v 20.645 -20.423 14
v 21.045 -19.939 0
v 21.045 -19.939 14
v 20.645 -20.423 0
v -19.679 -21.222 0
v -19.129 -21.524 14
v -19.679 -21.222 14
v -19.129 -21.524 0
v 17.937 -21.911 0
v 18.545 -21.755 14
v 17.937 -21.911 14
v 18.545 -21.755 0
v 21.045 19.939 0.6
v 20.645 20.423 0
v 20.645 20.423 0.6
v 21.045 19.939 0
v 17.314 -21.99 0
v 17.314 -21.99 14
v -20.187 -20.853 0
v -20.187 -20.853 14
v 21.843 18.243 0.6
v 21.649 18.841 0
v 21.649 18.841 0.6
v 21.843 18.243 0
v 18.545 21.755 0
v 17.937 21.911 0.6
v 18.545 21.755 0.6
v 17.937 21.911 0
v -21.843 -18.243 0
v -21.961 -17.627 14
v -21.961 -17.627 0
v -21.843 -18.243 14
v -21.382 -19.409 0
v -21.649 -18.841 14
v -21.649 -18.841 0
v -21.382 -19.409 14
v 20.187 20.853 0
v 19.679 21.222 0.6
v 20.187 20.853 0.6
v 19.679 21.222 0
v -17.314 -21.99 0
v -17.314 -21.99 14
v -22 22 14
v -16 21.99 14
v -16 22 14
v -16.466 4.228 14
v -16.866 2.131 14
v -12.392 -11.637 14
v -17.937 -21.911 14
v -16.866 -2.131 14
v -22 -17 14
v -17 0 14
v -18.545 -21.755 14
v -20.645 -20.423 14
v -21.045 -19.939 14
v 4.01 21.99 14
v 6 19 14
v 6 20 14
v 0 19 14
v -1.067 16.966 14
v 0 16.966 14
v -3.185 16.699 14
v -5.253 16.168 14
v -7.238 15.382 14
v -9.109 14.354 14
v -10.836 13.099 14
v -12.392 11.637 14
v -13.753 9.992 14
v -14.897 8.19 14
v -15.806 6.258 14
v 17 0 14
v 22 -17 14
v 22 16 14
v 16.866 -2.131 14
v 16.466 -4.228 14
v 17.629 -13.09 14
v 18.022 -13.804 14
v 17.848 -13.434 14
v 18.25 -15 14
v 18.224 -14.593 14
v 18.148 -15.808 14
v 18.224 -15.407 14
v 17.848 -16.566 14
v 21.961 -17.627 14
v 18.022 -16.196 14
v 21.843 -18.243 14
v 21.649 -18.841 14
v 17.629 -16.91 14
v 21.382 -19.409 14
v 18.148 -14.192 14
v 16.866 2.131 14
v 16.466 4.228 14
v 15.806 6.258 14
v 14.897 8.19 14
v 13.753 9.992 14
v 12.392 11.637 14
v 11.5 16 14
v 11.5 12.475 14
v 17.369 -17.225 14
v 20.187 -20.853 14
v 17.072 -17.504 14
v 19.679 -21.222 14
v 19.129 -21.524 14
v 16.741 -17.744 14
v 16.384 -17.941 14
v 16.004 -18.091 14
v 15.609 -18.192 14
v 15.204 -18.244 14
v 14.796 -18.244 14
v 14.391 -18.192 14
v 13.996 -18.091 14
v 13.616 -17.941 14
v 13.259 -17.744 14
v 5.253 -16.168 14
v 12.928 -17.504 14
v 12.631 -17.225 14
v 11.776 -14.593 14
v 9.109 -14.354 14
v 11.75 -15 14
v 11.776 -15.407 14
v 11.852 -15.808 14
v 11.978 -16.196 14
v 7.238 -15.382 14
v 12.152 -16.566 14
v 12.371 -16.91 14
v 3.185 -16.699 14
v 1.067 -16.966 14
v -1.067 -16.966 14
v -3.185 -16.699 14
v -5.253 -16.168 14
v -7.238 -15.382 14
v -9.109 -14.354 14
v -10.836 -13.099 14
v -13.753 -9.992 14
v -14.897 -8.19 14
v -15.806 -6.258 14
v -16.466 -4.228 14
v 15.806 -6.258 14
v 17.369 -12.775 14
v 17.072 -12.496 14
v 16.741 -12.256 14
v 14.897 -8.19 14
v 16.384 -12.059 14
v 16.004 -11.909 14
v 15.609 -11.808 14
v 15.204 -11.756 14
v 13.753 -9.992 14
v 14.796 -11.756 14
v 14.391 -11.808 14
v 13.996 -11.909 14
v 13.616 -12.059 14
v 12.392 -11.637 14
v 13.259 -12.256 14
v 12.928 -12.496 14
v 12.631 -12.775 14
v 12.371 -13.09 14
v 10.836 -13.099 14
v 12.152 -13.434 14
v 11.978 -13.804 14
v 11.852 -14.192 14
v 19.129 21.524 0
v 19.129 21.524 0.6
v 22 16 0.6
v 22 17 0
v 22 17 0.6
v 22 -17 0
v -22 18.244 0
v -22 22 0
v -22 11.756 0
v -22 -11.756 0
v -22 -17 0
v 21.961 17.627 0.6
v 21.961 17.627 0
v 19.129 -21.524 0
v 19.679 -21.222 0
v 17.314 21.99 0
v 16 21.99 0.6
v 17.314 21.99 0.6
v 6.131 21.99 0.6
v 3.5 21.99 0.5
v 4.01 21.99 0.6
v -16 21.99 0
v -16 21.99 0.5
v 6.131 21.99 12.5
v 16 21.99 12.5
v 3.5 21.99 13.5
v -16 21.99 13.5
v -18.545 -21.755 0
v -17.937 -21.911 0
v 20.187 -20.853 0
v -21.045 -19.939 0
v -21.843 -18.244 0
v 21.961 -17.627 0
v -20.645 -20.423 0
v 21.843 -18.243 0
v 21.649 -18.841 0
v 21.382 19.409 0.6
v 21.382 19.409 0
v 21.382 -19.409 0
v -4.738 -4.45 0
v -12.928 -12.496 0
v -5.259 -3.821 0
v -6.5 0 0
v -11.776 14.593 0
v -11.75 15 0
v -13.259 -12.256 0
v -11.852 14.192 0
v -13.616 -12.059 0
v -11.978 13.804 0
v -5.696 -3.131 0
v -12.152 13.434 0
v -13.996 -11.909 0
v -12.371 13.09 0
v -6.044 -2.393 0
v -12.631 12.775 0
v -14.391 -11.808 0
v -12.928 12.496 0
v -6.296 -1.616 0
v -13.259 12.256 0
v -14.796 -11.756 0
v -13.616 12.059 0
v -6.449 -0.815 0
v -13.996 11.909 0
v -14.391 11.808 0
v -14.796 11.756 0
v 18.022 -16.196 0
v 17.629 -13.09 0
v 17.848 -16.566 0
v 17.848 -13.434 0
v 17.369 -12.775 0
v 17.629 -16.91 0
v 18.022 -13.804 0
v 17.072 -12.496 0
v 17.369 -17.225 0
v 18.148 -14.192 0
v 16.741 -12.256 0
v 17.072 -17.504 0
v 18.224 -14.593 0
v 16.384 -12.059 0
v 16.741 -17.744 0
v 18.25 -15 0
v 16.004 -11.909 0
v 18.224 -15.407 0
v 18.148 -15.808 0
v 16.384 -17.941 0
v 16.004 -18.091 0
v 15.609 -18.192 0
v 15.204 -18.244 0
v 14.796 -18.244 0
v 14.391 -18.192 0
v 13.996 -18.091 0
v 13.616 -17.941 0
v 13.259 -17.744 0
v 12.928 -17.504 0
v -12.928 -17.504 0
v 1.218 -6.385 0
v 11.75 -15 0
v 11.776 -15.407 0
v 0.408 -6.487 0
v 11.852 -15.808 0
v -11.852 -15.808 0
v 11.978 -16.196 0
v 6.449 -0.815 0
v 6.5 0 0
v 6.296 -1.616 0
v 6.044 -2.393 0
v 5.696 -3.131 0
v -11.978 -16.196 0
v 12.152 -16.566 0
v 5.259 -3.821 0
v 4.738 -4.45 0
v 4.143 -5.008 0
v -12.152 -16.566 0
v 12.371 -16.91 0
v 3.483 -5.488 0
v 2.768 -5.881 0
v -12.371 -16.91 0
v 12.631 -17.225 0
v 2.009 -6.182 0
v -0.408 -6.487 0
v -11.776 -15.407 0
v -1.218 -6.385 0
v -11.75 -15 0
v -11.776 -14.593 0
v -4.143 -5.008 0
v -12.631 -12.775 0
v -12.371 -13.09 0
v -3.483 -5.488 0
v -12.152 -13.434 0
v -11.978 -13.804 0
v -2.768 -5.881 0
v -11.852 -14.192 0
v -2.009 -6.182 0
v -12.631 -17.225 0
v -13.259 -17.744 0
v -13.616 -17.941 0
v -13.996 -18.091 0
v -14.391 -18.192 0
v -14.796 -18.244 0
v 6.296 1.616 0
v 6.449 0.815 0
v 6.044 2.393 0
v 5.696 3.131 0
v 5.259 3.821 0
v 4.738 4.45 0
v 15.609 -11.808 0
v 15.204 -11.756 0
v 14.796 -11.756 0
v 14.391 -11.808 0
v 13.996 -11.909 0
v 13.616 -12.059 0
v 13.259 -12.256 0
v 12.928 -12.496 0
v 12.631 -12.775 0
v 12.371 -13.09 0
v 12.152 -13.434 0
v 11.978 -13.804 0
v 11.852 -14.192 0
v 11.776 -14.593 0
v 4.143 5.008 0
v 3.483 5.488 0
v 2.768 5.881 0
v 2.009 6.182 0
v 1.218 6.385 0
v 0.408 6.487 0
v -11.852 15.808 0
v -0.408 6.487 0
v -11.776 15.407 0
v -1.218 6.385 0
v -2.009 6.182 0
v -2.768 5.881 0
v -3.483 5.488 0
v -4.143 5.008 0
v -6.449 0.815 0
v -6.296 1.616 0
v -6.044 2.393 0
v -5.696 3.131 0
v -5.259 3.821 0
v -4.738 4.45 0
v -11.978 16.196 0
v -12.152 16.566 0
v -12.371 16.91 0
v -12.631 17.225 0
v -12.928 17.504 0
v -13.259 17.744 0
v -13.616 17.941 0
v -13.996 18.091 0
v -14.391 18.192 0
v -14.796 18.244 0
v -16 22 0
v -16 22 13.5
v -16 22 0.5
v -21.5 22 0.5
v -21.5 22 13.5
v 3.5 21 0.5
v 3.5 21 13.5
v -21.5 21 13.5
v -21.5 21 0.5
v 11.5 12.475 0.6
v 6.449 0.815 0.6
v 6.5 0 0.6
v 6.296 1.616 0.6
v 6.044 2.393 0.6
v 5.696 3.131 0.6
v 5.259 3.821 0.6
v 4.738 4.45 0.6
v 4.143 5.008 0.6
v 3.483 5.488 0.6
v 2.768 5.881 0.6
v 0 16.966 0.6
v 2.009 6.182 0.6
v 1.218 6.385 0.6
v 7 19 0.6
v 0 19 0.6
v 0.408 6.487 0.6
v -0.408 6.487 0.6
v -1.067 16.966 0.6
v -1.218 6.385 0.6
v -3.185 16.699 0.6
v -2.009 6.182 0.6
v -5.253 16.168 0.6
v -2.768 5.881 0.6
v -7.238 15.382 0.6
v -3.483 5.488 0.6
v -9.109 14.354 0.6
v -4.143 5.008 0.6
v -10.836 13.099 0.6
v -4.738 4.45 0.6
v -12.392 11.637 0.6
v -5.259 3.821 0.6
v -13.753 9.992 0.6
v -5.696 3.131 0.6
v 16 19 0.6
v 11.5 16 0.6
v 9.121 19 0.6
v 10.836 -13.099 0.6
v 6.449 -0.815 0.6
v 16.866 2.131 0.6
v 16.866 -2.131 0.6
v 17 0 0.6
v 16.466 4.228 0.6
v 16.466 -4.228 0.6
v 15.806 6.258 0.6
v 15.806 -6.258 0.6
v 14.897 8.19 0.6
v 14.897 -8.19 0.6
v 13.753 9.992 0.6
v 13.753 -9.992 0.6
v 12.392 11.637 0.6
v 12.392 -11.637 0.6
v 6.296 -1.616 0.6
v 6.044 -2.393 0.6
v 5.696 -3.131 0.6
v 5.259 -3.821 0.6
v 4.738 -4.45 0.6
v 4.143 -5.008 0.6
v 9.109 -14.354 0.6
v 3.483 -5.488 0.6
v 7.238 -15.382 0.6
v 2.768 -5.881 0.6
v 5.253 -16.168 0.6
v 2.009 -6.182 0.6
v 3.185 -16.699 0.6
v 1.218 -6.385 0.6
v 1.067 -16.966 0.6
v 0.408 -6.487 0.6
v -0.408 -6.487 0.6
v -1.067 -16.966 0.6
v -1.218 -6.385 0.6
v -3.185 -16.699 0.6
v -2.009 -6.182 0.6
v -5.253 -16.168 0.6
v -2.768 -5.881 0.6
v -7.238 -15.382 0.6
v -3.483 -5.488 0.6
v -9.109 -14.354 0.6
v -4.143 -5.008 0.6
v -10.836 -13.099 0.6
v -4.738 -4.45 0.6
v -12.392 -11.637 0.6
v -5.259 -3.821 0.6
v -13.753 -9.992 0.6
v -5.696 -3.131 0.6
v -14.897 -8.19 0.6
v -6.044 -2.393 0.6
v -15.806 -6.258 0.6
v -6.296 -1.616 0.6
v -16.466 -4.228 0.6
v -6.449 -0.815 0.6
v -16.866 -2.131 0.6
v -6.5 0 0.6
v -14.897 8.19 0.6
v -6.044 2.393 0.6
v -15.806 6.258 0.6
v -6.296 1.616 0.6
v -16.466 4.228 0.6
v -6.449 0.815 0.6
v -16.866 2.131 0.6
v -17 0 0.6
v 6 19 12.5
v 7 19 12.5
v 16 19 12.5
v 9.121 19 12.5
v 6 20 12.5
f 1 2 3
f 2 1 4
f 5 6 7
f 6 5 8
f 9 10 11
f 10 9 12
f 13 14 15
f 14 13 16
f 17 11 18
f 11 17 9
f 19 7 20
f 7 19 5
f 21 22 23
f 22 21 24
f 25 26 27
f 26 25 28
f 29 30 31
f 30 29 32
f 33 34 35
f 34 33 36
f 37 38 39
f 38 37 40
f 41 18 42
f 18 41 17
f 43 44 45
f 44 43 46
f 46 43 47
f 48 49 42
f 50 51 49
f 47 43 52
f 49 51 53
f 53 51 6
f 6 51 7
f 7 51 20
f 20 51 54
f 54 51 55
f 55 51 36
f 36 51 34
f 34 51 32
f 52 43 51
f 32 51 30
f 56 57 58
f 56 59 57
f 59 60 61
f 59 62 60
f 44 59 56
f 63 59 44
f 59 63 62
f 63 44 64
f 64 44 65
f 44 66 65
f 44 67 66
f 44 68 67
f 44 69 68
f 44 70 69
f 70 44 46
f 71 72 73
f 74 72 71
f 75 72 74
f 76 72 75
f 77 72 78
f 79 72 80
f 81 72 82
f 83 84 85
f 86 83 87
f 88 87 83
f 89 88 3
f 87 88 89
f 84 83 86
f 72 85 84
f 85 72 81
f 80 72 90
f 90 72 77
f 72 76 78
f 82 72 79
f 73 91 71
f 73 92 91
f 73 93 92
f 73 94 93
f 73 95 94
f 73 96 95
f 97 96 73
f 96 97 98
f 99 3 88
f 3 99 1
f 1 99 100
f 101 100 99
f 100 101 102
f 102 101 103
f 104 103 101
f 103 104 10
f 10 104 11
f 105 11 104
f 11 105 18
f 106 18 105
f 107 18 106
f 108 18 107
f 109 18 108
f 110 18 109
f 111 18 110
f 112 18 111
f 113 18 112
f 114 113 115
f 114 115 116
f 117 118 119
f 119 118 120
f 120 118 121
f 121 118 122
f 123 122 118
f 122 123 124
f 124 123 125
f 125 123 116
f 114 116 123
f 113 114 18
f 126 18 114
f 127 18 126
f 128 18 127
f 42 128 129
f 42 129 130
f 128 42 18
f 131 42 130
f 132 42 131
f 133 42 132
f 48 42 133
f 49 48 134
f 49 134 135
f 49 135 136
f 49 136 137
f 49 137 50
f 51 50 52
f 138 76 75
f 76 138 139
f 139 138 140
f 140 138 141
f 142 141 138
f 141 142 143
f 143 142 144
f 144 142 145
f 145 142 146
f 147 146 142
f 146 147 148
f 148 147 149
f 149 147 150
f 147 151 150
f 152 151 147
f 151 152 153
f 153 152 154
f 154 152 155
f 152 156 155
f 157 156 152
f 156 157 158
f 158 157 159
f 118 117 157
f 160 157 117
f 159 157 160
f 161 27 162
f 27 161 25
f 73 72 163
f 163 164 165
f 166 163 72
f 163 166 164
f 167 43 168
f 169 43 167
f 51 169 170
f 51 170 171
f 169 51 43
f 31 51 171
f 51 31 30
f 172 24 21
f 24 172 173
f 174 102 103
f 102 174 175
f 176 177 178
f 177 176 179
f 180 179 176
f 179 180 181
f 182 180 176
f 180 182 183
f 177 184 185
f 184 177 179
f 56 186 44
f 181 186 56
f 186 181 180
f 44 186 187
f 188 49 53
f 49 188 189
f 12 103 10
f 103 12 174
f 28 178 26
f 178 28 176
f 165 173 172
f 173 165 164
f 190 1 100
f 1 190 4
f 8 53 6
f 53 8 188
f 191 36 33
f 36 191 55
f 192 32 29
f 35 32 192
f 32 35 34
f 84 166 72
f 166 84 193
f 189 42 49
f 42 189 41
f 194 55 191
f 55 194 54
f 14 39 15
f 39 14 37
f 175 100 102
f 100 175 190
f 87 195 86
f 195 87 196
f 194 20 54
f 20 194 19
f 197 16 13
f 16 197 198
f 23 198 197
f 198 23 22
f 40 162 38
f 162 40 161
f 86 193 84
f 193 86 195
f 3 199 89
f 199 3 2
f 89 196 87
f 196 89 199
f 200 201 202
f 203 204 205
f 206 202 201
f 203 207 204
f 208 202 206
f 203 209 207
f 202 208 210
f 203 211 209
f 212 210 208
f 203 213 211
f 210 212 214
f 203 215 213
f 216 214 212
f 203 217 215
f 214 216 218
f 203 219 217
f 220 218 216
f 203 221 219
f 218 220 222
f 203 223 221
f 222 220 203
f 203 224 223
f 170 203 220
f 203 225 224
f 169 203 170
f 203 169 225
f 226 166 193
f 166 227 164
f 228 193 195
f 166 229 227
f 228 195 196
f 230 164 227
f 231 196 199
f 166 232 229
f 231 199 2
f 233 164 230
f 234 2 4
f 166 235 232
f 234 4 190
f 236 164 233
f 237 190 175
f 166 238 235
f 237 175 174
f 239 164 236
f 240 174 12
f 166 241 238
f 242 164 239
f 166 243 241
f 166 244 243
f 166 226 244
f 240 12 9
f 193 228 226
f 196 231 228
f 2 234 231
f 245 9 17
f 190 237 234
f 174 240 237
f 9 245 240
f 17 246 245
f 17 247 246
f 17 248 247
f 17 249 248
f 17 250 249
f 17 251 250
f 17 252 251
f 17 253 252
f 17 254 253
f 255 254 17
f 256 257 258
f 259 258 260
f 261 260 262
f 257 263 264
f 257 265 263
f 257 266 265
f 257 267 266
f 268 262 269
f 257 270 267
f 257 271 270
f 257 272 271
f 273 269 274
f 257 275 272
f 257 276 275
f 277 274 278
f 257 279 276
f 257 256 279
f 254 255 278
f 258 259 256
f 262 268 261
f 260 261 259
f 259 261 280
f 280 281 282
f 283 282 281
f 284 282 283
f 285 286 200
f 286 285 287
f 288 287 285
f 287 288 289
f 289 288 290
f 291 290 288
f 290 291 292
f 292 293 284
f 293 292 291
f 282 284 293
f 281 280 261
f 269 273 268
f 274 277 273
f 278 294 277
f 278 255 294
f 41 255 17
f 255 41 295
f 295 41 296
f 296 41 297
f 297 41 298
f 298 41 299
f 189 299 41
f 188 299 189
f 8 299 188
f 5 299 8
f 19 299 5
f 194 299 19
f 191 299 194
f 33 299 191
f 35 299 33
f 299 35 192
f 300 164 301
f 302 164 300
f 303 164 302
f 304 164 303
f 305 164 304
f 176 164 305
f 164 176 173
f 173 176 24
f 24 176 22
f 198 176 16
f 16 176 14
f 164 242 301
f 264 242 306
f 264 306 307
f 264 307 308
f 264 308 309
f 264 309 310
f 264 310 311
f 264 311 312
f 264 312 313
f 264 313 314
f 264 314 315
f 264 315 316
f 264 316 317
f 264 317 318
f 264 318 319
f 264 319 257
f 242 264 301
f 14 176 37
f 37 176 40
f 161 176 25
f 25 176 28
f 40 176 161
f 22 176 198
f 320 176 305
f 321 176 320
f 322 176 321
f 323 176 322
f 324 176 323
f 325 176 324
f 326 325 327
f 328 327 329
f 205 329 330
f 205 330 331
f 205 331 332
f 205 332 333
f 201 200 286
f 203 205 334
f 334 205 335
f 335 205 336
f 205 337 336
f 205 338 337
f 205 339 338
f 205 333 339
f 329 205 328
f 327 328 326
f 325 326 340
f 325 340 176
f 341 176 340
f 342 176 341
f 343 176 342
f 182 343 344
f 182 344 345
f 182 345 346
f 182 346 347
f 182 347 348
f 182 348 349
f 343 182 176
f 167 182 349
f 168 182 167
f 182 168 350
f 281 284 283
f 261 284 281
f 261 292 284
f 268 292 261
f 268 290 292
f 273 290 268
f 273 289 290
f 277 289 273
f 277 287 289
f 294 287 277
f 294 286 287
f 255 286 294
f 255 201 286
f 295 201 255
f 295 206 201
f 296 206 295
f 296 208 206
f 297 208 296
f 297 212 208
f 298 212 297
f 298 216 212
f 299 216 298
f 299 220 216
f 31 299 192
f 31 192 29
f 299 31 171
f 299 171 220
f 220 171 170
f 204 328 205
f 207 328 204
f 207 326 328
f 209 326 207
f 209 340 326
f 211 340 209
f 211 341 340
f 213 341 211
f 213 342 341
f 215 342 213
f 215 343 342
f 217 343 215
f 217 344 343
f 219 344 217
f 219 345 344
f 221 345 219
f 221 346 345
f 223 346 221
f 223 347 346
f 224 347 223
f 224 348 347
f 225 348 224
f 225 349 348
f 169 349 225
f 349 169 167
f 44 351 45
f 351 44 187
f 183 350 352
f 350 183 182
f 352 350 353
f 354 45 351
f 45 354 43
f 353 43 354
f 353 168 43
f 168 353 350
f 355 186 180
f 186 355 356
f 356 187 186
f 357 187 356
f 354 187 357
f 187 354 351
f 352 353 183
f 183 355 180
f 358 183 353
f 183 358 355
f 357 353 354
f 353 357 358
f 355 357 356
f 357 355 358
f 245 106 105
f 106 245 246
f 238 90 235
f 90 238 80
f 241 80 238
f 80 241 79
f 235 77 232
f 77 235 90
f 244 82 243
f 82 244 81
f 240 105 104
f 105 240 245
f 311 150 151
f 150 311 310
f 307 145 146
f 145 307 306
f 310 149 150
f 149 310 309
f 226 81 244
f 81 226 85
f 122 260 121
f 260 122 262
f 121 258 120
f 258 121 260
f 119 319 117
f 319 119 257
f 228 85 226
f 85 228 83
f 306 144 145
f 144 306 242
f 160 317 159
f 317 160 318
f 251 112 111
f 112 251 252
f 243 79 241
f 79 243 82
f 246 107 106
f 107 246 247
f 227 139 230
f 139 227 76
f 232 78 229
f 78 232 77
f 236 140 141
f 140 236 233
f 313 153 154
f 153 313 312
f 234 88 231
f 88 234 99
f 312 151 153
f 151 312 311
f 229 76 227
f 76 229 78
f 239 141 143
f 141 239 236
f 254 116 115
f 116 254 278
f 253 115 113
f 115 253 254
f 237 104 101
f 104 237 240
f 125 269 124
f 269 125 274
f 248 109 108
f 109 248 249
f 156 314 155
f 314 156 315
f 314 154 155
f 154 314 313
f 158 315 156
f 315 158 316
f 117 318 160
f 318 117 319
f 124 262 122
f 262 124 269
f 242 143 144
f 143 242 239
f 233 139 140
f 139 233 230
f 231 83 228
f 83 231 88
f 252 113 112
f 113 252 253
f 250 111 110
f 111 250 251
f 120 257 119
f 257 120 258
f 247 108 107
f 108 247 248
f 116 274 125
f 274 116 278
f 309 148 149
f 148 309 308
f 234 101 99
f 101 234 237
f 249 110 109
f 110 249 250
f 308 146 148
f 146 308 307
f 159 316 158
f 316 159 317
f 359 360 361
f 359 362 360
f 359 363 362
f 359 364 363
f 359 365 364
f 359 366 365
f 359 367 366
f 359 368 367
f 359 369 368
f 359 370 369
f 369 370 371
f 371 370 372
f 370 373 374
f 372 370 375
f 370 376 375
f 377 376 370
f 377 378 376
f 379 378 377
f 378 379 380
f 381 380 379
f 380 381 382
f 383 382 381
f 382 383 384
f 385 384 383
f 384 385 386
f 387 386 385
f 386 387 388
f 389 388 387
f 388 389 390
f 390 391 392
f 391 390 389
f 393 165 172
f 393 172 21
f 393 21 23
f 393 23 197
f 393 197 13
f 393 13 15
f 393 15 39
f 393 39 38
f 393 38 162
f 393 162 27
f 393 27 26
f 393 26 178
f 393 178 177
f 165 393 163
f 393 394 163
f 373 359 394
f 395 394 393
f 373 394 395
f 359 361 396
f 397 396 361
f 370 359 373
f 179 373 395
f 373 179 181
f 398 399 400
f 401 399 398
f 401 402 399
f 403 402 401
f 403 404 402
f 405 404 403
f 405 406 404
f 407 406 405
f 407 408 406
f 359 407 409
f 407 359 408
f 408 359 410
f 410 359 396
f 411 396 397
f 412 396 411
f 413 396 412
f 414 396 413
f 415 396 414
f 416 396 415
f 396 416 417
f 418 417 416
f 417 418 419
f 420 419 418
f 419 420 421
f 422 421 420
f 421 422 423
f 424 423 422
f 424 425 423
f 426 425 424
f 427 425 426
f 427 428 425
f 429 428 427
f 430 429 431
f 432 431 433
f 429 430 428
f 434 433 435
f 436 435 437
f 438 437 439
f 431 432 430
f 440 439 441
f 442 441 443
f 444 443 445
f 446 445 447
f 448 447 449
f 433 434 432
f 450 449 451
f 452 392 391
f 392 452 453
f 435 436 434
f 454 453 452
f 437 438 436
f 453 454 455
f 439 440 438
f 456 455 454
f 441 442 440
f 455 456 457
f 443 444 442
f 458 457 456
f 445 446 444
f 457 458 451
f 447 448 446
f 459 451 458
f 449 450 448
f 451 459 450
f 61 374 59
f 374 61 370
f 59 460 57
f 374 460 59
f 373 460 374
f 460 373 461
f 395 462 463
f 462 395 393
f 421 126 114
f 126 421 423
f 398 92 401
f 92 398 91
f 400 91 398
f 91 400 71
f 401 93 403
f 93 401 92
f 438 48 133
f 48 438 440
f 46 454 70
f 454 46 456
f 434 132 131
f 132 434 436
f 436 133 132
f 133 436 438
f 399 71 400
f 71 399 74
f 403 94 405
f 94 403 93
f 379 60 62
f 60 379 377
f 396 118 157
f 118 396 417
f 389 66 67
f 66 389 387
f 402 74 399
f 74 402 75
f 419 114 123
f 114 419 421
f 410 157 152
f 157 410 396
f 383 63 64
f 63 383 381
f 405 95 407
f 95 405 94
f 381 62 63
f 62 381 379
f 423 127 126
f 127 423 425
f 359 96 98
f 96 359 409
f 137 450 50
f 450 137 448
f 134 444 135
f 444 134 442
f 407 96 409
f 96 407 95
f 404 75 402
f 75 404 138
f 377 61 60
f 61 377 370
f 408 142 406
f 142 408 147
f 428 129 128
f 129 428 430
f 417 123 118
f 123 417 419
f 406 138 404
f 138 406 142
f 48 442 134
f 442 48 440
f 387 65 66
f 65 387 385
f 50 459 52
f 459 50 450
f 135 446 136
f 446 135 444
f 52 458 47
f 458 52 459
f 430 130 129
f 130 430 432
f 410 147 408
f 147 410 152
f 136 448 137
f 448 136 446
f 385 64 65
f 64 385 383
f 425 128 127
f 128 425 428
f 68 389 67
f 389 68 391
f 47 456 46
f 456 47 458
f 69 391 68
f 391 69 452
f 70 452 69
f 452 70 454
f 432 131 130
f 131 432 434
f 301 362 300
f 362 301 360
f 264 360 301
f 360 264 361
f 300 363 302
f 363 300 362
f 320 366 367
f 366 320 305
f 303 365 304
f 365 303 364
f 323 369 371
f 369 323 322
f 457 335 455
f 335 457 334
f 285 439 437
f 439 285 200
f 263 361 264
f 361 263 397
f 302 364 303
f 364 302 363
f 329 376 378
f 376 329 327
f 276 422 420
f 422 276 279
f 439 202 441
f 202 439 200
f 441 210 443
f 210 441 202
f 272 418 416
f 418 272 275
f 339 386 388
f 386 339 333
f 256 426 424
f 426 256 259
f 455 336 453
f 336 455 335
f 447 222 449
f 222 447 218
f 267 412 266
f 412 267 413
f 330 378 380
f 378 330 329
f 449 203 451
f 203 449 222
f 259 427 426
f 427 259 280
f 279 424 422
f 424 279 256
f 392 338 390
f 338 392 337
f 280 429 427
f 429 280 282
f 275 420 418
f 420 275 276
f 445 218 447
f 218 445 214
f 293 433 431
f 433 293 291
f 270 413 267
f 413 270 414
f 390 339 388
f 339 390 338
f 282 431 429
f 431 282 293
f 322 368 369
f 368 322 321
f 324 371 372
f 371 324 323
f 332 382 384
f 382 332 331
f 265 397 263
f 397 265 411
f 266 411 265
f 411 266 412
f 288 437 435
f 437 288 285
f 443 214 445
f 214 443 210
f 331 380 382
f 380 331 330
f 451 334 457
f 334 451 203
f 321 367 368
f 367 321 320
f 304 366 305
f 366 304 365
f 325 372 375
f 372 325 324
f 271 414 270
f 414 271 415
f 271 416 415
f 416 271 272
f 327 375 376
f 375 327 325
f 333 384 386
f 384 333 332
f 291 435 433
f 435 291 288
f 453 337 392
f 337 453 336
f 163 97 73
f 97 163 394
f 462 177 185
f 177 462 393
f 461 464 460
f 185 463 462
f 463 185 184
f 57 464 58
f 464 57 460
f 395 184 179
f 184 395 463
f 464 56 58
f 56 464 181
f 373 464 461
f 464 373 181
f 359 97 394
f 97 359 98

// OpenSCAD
$fn = 50;


difference() {
	union() {
		hull() {
			translate(v = [-17.0000000000, 17.0000000000, 0]) {
				cylinder(h = 14, r = 5);
			}
			translate(v = [17.0000000000, 17.0000000000, 0]) {
				cylinder(h = 14, r = 5);
			}
			translate(v = [-17.0000000000, -17.0000000000, 0]) {
				cylinder(h = 14, r = 5);
			}
			translate(v = [17.0000000000, -17.0000000000, 0]) {
				cylinder(h = 14, r = 5);
			}
		}
		translate(v = [-22.0000000000, 16.0000000000, 0]) {
			cube(size = [6, 6, 14]);
		}
	}
	union() {
		translate(v = [-22.5000000000, -15.0000000000, -250.0000000000]) {
			rotate(a = [0, 0, 0]) {
				difference() {
					union() {
						hull() {
							translate(v = [7.5000000000, 0, 0]) {
								cylinder(h = 250, r = 3.2500000000, r1 = 3.2500000000, r2 = 3.2500000000);
							}
							translate(v = [-7.5000000000, 0, 0]) {
								cylinder(h = 250, r = 3.2500000000, r1 = 3.2500000000, r2 = 3.2500000000);
							}
						}
					}
					union();
				}
			}
		}
		translate(v = [-22.5000000000, 15.0000000000, -250.0000000000]) {
			rotate(a = [0, 0, 0]) {
				difference() {
					union() {
						hull() {
							translate(v = [7.5000000000, 0, 0]) {
								cylinder(h = 250, r = 3.2500000000, r1 = 3.2500000000, r2 = 3.2500000000);
							}
							translate(v = [-7.5000000000, 0, 0]) {
								cylinder(h = 250, r = 3.2500000000, r1 = 3.2500000000, r2 = 3.2500000000);
							}
						}
					}
					union();
				}
			}
		}
		translate(v = [-21.5000000000, 21.0000000000, 0.5000000000]) {
			cube(size = [25, 1, 13.0000000000]);
		}
		translate(v = [15.0000000000, -15.0000000000, -50.0000000000]) {
			cylinder(h = 100, r = 3.2500000000);
		}
		translate(v = [0.0000000000, 11.0000000000, 0.6000000000]) {
			cube(size = [11, 8, 16.4000000000]);
		}
		translate(v = [0, 0, 0.6000000000]) {
			cylinder(h = 16.4000000000, r = 17.0000000000);
		}
		translate(v = [0, 0, -7.0000000000]) {
			cylinder(h = 14, r = 6.5000000000);
		}
		translate(v = [0.0000000000, 16.0000000000, 0.6000000000]) {
			cube(size = [22.0000000000, 3, 16.4000000000]);
		}
		translate(v = [16.0000000000, 16.0000000000, 0.6000000000]) {
			cube(size = [6, 6, 16.4000000000]);
		}
		translate(v = [6.0000000000, 16.0000000000, 12.5000000000]) {
			cube(size = [16, 6, 1.5000000000]);
		}
		translate(v = [3.2500000000, 22.7500000000, 0.6000000000]) {
			rotate(a = [0, 0, -45]) {
				cube(size = [7.5000000000, 1.5000000000, 16.4000000000]);
			}
		}
		translate(v = [2.5000000000, 11.0000000000, 0.6000000000]) {
			cube(size = [9.0000000000, 5, 13.4000000000]);
		}
	}
}
